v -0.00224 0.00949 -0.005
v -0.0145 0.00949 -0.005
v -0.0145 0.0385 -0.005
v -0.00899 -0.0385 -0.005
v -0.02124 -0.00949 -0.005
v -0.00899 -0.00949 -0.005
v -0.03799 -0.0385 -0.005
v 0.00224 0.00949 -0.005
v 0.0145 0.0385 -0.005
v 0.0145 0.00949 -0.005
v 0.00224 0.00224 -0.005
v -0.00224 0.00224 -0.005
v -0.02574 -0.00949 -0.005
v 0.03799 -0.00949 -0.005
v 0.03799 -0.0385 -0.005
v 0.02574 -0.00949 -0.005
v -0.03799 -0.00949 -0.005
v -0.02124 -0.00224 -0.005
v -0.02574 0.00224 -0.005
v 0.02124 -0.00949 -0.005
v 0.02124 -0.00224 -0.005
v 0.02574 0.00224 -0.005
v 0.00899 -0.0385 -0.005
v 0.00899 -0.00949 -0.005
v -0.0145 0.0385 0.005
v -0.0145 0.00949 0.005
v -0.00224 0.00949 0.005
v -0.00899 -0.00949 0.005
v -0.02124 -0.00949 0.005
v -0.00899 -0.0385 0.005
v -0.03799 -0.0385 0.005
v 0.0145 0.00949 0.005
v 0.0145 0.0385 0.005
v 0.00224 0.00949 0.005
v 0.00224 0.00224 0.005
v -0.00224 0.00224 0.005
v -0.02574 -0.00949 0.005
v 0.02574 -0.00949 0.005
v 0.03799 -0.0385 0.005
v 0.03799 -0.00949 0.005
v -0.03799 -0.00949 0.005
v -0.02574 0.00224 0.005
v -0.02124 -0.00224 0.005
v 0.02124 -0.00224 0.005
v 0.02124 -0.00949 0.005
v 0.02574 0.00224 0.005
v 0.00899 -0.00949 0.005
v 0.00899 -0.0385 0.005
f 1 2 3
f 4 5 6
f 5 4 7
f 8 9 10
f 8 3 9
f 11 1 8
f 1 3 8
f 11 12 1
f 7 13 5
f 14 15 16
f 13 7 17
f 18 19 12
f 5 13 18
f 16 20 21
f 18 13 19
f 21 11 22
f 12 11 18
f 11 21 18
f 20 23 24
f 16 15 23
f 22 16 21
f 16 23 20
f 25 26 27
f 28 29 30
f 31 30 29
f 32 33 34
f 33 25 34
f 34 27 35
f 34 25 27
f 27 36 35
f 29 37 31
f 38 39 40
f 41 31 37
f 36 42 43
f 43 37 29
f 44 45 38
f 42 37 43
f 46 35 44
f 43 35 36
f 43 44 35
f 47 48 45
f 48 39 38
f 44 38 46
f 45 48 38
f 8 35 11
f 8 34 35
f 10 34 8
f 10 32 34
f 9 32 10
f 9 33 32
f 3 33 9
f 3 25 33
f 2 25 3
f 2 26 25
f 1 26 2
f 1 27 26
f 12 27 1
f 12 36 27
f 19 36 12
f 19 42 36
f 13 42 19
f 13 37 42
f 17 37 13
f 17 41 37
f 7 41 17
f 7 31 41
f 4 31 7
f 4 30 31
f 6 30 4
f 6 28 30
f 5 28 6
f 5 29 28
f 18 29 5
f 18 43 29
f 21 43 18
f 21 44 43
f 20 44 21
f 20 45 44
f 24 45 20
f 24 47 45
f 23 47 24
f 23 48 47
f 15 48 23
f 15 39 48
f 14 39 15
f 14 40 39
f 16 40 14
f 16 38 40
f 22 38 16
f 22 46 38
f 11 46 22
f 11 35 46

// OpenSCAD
boxSize = 0.029;
lineSize = 0.0045;
symDepth = 0.01;
vertSeparation = 0.019;
horizSeparation = 0.018;

module DataSymbol() {
  boxVertCenter = (boxSize+vertSeparation)/2;
  boxHorizCenter = (boxSize+horizSeparation)/2;
  linear_extrude(symDepth, center=true) {
    translate([0,boxVertCenter]) square(boxSize, center=true); // top box
    translate([-boxHorizCenter,-boxVertCenter]) square(boxSize, center=true); // bottom left box
    translate([boxHorizCenter,-boxVertCenter]) square(boxSize, center=true); // bottom right box
    square([2*boxHorizCenter + lineSize, lineSize], center=true); // middle line
    translate([0, horizSeparation/4]) square([lineSize, horizSeparation/2 + lineSize], center=true); // line to top
    translate([-boxHorizCenter, -horizSeparation/4]) square([lineSize, horizSeparation/2 + lineSize], center=true); // line to bottom left
    translate([boxHorizCenter, -horizSeparation/4]) square([lineSize, horizSeparation/2 + lineSize], center=true); // line to bottom right
  }
}

DataSymbol();
